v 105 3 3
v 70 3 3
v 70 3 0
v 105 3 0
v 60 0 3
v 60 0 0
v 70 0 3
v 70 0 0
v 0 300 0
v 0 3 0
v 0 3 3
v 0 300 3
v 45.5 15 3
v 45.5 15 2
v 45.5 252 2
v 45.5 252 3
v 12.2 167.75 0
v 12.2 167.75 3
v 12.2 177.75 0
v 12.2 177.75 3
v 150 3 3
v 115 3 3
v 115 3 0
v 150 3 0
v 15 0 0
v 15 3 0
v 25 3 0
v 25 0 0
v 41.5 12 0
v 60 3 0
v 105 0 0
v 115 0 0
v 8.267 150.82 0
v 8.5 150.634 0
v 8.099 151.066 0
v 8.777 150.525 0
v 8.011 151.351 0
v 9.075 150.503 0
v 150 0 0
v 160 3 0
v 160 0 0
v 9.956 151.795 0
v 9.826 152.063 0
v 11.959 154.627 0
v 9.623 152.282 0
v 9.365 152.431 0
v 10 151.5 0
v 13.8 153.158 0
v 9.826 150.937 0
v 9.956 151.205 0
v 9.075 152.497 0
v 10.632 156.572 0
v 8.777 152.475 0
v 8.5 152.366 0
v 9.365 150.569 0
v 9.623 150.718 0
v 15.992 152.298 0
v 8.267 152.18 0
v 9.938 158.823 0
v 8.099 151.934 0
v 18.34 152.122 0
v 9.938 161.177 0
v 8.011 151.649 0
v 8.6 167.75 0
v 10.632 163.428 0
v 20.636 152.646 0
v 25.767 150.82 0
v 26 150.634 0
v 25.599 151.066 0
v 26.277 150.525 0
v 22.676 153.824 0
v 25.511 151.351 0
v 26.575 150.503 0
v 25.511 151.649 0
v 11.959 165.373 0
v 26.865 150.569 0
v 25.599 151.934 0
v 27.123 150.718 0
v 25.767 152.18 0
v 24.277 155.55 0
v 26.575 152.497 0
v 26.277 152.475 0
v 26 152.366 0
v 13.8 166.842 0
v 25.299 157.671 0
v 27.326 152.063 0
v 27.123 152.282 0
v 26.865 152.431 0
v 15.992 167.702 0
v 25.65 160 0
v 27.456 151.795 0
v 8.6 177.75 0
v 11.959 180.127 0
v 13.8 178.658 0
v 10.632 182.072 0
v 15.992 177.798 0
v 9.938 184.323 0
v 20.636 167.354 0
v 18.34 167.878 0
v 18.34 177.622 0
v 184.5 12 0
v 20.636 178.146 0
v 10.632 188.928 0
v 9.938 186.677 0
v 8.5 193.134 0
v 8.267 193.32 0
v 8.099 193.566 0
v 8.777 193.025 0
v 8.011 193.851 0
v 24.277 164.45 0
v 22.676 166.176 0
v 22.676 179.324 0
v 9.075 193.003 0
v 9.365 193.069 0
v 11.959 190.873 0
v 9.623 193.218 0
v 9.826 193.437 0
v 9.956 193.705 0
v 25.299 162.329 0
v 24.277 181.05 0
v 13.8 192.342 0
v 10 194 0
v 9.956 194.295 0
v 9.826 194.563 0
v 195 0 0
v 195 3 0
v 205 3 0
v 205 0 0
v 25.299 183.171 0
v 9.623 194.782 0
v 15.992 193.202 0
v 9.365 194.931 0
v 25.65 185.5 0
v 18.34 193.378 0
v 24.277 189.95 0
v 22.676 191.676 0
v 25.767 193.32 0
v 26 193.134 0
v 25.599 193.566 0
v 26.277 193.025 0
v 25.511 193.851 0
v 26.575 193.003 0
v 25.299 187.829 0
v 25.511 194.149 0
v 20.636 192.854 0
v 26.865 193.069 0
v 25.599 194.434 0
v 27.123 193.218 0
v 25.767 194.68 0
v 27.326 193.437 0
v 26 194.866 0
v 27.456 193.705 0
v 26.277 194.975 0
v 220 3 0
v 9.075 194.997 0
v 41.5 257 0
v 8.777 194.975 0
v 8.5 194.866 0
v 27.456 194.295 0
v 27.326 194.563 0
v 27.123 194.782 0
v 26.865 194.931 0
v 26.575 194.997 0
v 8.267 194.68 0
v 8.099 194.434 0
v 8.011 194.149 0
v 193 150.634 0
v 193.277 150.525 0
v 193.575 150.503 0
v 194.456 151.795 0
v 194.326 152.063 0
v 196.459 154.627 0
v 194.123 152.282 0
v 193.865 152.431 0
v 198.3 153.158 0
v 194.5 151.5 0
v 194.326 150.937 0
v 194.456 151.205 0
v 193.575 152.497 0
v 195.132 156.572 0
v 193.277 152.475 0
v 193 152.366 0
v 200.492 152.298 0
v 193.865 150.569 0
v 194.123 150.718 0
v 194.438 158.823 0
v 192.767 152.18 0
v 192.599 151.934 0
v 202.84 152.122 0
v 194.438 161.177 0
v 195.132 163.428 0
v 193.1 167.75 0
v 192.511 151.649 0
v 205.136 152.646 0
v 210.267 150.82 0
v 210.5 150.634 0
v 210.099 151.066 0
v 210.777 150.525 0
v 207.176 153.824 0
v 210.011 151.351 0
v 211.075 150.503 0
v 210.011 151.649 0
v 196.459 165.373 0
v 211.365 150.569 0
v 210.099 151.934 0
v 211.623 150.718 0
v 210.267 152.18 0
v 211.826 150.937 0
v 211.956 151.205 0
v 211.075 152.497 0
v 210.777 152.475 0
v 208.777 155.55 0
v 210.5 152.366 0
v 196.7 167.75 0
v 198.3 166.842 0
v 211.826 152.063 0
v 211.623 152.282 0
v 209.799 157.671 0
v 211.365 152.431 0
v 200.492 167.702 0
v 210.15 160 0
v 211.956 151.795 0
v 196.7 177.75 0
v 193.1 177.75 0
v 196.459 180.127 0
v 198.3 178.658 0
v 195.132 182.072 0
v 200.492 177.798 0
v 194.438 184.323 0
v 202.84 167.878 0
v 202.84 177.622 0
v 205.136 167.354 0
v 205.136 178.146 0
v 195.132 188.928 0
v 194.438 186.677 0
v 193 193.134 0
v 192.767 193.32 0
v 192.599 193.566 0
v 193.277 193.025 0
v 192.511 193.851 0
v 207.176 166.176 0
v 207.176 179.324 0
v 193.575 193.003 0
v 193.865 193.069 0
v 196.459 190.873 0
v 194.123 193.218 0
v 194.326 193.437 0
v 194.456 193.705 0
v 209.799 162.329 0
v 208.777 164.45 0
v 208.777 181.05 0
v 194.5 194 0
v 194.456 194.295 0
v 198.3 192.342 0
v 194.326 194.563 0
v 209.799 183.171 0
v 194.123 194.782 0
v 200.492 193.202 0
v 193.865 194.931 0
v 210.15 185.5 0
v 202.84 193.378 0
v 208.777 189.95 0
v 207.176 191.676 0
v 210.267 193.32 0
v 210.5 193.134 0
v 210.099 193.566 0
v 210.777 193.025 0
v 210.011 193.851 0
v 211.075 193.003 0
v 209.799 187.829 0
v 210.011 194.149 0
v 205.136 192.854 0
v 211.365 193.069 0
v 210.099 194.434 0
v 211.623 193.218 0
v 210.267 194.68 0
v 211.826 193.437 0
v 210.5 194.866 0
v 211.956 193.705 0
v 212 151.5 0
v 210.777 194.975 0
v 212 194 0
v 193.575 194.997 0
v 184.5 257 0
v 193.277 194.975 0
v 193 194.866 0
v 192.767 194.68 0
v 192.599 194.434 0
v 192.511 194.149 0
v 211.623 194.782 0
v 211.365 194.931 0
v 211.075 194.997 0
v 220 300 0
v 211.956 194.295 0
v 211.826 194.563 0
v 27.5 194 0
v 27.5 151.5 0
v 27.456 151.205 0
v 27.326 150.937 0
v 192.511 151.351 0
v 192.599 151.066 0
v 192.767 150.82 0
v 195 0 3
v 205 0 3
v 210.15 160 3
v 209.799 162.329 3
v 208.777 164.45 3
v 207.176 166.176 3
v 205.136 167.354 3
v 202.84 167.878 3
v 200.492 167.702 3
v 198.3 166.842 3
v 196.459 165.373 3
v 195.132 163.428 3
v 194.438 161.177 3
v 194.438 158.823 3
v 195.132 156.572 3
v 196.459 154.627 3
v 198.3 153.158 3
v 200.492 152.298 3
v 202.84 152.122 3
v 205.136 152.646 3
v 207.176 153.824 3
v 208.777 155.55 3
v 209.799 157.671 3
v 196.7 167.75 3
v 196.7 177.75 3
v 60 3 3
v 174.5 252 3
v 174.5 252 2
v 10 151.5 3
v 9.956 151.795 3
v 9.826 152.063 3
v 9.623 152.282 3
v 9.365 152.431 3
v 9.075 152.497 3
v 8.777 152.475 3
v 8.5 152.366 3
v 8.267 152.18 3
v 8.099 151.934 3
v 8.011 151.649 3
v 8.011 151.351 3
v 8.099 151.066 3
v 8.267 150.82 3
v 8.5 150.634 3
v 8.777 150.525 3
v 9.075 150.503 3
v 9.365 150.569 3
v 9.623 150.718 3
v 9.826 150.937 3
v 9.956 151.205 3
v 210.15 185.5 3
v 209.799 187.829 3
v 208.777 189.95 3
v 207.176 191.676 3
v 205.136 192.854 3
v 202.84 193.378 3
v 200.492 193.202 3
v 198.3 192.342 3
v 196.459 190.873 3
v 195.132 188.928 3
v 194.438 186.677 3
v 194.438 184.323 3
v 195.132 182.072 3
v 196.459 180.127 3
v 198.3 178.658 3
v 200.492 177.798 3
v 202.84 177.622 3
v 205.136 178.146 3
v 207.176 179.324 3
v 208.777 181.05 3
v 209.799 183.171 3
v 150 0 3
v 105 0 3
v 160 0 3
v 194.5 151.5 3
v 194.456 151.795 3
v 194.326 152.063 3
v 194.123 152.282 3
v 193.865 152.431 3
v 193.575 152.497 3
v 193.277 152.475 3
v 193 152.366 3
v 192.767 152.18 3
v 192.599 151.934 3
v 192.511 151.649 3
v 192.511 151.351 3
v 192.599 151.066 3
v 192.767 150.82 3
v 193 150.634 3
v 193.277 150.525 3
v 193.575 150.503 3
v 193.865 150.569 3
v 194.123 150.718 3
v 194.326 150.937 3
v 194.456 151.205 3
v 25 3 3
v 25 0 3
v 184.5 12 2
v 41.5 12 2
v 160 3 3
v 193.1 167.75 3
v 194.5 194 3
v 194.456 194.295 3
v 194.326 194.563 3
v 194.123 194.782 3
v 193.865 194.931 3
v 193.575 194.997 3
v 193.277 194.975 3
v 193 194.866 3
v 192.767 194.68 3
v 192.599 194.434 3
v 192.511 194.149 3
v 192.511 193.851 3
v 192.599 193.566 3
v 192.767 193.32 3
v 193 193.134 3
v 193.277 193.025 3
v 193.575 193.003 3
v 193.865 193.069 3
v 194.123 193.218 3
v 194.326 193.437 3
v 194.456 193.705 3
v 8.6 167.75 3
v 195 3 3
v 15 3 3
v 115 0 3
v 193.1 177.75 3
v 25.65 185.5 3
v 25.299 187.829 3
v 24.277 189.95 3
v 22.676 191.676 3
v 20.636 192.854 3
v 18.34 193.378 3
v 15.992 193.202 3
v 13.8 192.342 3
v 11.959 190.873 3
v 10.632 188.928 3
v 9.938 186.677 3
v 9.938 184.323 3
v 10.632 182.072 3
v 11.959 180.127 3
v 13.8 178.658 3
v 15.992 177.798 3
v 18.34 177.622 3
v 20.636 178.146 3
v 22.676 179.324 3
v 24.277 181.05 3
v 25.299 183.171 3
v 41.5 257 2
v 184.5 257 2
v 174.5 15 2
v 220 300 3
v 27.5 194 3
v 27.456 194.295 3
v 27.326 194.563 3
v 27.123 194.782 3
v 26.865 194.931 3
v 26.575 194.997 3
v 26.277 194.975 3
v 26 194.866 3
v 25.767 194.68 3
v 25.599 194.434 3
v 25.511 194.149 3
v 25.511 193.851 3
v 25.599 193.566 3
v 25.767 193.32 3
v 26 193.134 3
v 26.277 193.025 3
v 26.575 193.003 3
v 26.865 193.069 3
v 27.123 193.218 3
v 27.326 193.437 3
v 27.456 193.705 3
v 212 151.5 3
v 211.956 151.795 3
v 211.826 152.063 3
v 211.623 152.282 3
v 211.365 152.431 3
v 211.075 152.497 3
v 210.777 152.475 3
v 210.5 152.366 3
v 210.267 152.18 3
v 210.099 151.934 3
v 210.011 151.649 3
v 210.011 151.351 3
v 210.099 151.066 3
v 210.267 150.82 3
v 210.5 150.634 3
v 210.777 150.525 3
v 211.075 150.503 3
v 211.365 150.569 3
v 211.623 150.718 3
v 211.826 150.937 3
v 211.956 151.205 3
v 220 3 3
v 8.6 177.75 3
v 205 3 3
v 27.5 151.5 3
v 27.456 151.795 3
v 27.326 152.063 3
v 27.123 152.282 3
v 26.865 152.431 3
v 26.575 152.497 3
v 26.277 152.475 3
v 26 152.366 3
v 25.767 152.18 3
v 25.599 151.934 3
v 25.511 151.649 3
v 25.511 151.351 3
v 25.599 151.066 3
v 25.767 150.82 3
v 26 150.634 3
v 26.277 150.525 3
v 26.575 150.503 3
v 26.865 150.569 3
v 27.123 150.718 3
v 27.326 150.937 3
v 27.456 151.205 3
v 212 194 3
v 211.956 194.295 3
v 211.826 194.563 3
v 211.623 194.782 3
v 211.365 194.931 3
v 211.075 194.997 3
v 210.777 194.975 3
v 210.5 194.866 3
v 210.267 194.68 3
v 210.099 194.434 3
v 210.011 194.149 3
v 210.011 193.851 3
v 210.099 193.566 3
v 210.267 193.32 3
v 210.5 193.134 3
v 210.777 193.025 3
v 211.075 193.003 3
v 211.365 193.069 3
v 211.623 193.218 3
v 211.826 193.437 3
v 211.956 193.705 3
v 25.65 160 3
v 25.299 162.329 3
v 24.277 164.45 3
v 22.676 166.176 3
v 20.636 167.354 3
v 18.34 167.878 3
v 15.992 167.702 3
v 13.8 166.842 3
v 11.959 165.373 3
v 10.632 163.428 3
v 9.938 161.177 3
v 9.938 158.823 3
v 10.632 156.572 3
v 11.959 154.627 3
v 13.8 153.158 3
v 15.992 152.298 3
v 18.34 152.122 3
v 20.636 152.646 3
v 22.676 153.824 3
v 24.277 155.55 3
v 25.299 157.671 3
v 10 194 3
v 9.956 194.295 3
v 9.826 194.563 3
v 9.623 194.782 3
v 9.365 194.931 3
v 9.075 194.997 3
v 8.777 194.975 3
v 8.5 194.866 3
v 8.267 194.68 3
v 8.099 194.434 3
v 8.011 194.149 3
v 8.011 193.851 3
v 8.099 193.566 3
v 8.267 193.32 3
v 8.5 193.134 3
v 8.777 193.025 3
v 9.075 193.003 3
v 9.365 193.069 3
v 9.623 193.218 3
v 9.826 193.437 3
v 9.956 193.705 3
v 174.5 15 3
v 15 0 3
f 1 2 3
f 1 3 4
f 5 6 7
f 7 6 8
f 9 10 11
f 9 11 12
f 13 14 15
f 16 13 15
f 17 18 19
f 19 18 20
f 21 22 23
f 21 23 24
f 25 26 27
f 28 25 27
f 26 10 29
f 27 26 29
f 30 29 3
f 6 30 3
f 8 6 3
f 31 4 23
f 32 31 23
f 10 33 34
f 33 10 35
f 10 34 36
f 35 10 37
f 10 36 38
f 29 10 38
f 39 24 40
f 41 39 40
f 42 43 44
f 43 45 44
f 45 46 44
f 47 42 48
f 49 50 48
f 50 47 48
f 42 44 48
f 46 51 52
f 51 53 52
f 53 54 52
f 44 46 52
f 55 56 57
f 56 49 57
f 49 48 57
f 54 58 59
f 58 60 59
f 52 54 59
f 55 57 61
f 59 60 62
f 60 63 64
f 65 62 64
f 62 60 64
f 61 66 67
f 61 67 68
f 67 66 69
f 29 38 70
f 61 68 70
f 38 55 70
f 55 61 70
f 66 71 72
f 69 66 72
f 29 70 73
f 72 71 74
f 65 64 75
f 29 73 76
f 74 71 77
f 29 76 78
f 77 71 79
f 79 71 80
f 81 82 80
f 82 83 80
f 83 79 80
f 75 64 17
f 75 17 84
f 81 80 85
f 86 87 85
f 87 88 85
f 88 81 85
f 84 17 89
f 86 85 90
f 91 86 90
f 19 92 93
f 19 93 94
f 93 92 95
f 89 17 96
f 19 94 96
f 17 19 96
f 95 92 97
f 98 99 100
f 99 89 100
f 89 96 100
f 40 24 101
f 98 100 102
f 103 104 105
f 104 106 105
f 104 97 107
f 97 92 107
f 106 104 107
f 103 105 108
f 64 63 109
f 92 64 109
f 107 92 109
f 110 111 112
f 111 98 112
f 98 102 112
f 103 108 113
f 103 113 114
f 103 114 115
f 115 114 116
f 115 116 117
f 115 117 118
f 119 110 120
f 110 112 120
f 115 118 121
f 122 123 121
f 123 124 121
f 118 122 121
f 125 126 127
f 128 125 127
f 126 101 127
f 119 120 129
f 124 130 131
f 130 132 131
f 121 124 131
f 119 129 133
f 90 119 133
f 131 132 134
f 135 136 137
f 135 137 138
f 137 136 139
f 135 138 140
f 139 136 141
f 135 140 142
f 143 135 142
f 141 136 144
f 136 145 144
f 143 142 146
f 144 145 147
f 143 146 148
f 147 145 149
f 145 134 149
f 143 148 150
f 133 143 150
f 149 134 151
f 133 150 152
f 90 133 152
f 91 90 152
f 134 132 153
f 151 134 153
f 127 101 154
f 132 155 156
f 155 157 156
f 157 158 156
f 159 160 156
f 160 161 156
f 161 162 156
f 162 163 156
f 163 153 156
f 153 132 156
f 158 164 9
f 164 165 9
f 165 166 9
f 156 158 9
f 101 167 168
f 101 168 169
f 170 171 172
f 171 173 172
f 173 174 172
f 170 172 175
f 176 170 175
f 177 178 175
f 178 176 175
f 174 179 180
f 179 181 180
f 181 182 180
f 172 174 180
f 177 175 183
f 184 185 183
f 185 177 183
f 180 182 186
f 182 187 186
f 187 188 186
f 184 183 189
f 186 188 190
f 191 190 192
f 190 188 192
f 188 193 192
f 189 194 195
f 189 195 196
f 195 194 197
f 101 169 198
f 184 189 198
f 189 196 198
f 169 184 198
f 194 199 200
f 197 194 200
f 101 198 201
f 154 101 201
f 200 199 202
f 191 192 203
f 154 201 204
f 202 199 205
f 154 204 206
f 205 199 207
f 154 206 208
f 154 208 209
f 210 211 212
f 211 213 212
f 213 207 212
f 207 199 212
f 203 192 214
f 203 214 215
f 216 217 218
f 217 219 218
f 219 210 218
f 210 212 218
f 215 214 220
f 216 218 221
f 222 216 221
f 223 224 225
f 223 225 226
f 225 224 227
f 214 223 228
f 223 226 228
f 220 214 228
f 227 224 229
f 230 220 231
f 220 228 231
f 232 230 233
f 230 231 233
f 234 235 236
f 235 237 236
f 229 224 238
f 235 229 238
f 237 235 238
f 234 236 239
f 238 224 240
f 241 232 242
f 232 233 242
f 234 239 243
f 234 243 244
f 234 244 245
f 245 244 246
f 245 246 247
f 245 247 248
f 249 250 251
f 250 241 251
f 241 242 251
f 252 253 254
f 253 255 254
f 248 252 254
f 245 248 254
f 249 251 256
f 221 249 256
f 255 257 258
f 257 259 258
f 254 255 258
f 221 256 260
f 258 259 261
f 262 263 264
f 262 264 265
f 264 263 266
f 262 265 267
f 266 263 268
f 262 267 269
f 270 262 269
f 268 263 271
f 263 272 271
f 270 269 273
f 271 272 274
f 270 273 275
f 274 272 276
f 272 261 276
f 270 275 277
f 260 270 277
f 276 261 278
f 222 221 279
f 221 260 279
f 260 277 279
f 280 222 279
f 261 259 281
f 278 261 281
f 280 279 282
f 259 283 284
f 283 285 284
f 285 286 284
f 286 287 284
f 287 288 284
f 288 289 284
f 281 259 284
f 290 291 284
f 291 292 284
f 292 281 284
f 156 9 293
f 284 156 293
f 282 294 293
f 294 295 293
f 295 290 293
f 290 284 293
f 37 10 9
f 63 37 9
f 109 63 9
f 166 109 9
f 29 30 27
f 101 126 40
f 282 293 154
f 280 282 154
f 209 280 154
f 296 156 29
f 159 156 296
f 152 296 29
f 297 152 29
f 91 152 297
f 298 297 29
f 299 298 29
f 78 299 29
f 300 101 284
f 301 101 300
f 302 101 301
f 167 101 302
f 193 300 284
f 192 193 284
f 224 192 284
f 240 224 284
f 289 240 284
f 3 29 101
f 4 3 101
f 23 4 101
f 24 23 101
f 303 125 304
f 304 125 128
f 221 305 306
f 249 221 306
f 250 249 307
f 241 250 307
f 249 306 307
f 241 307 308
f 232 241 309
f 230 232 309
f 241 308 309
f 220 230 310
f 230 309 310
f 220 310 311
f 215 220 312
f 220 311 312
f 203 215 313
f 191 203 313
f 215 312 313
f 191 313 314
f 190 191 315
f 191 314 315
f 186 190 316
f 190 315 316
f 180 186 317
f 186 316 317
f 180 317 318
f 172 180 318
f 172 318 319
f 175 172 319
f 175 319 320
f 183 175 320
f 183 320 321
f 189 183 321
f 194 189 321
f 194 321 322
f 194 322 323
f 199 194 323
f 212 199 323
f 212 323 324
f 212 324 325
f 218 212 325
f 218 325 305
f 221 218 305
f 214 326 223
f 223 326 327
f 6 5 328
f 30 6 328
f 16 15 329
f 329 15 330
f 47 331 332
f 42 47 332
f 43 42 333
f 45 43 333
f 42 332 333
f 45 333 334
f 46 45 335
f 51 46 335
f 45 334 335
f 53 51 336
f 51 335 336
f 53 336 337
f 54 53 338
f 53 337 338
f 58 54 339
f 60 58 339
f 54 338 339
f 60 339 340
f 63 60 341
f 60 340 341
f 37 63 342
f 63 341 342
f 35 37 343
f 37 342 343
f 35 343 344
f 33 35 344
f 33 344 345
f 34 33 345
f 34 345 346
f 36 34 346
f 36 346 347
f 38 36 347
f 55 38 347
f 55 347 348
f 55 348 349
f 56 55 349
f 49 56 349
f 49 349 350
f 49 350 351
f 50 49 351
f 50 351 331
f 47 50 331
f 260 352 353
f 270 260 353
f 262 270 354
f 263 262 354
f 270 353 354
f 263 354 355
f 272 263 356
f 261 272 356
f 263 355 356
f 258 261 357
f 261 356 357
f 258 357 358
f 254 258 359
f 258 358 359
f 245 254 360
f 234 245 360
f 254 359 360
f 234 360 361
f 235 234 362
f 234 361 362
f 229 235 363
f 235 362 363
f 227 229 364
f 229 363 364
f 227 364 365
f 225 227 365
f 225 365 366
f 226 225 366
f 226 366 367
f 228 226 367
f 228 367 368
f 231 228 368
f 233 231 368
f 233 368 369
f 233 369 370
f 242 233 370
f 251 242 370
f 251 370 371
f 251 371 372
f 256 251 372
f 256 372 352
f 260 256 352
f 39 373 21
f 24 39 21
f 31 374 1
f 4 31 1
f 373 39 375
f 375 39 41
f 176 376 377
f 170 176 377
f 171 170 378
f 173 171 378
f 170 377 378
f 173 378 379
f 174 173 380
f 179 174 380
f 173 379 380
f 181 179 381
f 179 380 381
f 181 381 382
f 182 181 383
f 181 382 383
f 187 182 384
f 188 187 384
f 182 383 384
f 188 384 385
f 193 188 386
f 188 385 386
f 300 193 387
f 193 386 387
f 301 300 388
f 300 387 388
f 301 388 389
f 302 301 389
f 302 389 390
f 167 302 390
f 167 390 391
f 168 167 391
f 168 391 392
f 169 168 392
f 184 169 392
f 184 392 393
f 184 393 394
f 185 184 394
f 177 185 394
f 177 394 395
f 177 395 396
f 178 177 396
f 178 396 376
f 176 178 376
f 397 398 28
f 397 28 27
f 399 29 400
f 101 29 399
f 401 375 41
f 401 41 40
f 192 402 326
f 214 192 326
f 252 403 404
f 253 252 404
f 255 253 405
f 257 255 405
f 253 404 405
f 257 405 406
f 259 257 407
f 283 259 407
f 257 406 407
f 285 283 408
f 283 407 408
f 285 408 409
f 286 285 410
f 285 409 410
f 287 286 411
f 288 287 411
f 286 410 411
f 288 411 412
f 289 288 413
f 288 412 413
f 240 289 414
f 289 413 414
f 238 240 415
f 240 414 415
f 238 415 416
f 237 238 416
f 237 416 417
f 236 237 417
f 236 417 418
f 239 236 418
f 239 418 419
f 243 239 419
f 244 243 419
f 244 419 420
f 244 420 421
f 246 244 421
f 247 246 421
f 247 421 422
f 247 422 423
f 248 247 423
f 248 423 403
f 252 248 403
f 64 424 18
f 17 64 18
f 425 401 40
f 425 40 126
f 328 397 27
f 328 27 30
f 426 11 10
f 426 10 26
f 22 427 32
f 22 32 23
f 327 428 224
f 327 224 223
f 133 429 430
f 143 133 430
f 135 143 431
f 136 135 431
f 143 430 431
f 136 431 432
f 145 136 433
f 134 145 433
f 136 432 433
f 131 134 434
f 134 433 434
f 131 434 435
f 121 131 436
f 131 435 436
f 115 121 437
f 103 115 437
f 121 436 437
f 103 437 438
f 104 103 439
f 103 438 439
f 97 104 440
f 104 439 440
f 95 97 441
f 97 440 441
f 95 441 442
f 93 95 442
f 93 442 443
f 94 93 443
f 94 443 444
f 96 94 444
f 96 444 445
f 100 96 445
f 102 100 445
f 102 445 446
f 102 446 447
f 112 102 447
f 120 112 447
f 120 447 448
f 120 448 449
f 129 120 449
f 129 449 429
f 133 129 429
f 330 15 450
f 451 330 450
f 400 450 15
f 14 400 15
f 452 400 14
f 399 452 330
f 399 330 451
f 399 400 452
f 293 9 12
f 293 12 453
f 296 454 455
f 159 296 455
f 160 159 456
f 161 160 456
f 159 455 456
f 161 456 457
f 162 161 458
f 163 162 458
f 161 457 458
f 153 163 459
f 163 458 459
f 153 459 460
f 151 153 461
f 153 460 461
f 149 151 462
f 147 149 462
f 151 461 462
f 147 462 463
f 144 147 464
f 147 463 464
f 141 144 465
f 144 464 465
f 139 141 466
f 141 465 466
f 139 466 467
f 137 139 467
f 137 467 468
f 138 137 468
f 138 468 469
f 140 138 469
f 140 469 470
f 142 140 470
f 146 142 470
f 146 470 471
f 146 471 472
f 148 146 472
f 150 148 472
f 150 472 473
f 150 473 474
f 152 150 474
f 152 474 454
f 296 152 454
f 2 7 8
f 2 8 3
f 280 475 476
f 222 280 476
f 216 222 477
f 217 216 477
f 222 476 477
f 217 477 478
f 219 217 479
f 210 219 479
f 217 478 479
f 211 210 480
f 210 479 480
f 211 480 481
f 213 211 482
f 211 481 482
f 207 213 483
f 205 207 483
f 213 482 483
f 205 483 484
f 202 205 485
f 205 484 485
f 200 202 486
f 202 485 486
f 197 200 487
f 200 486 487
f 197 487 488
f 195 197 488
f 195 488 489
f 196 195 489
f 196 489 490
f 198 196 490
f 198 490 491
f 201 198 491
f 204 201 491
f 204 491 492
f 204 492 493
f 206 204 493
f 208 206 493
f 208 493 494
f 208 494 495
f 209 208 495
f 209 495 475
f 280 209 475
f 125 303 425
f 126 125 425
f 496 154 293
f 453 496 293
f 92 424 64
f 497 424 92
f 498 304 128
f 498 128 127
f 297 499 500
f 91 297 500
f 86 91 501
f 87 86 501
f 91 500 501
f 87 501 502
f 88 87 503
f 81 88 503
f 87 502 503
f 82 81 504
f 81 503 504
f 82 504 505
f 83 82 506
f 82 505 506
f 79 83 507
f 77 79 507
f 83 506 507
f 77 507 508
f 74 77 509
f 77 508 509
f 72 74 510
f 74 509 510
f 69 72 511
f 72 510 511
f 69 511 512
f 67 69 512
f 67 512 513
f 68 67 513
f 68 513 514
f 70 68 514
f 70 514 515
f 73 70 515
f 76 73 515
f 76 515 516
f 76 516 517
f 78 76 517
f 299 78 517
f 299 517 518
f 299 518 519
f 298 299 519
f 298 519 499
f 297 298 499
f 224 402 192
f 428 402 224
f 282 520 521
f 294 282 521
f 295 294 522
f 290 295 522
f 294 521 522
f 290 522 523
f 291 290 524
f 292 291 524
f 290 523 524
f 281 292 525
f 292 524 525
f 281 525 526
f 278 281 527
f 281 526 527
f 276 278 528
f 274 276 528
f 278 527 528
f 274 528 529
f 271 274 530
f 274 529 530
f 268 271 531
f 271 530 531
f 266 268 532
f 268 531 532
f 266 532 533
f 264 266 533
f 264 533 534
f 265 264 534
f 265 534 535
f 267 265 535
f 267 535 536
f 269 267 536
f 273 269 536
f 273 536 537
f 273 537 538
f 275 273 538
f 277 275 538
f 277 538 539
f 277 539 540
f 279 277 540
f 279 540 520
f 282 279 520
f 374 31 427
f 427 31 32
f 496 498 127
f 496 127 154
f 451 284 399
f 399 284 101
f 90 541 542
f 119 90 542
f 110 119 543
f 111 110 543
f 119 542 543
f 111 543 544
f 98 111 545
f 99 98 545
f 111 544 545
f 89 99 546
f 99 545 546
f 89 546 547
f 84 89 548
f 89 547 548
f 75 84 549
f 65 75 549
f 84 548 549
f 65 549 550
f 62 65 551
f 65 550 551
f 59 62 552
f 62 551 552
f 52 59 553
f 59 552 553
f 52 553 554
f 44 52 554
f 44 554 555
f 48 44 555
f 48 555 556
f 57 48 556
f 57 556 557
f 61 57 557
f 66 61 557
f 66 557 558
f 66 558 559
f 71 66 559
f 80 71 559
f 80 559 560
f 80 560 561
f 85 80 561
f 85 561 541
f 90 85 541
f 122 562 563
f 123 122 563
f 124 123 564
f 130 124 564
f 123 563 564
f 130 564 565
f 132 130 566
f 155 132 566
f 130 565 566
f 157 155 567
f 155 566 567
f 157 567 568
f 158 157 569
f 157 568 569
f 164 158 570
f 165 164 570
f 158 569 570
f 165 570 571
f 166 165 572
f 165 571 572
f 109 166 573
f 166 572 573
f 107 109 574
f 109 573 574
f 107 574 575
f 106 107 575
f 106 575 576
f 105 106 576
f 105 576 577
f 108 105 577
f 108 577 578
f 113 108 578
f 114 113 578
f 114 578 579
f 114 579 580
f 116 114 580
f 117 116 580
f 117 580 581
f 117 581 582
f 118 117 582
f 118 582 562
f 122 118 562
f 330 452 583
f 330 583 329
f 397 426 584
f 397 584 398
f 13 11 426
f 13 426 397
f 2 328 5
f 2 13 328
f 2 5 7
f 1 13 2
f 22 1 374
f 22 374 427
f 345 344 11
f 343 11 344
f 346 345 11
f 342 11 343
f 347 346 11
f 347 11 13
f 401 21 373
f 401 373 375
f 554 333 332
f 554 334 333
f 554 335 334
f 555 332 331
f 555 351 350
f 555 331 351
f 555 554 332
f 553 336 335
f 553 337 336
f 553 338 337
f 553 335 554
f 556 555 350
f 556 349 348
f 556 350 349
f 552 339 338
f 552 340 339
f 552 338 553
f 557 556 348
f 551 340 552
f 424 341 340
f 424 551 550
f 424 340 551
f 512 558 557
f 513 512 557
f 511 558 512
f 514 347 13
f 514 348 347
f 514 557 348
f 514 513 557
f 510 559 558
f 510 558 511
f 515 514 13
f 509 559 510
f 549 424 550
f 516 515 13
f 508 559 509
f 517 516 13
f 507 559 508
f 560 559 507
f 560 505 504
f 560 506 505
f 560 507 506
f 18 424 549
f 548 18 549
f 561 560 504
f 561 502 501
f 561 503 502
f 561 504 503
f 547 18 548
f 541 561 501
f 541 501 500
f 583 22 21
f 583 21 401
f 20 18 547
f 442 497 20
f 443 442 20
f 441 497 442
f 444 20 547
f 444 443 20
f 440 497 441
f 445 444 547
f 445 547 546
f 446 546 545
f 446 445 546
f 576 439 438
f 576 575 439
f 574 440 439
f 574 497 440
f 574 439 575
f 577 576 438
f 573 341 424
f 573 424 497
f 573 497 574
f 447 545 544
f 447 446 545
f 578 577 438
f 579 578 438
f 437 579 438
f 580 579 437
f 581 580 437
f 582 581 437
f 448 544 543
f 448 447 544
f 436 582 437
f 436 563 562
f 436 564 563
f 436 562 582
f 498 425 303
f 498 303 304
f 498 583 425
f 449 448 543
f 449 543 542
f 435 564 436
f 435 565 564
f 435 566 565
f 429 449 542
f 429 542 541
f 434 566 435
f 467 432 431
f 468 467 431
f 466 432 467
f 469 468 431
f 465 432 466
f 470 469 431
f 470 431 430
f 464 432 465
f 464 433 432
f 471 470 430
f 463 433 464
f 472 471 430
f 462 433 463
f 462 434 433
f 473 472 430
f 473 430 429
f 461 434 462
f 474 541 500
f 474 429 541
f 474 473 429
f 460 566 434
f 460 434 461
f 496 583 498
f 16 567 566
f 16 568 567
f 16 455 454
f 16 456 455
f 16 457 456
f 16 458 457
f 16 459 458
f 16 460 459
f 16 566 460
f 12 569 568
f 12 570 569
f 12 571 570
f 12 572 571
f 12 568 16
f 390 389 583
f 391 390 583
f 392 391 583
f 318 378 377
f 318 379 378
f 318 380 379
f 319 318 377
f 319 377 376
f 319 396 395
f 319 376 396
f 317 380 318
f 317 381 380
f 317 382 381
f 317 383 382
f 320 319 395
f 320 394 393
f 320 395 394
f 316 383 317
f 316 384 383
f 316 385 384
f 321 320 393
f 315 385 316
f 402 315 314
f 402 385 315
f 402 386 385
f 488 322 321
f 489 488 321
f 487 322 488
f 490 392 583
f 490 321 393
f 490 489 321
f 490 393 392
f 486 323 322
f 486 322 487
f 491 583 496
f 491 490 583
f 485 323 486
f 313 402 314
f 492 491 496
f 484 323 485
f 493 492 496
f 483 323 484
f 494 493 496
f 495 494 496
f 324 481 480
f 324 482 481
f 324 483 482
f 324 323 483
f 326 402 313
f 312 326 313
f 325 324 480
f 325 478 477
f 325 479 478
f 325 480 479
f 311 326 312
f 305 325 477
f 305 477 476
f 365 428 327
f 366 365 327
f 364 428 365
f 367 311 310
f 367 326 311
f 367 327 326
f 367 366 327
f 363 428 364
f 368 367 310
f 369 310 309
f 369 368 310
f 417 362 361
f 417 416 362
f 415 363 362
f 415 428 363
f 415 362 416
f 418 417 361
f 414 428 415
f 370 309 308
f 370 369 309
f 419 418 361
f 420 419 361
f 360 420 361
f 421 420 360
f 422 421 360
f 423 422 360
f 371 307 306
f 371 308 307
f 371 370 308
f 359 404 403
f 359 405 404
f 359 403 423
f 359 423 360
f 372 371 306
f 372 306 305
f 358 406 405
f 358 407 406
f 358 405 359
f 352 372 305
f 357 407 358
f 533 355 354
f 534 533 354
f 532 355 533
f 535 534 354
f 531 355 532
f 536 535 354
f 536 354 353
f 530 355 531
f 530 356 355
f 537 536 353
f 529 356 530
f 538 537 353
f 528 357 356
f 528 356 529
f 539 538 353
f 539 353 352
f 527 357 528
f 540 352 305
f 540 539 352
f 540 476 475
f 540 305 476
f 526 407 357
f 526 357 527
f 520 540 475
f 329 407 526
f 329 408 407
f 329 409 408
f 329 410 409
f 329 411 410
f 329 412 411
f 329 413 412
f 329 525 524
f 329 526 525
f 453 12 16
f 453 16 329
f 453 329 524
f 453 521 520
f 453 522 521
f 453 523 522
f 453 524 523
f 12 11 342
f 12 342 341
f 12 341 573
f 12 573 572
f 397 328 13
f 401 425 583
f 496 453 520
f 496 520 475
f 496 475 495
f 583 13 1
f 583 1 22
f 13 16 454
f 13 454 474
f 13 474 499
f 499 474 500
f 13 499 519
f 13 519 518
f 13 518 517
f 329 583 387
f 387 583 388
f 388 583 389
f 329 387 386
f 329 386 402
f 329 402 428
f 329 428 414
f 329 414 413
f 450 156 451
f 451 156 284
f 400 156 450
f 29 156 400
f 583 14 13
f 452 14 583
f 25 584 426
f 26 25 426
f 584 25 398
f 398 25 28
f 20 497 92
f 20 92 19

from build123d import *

# Parameters (mm, degrees)
SKETCH_W        = 220
SKETCH_H        = 300
SKETCH_W_2      = 129
SKETCH_H_2      = 237
PAD_DEPTH       = 3
SKETCH001_W     = 143
SKETCH001_H     = 245
SKETCH001_W_2   = 129
SKETCH001_H_2   = 237
POCKET_DEPTH    = 2
SKETCH002_R     = 7.9
SKETCH002_R_2   = 1
SKETCH002_W     = 3.6
SKETCH002_H     = 10
SKETCH002_W_2   = 35
SKETCH002_H_2   = 3
SKETCH002_W_3   = 15
POCKET001_DEPTH = 3.001
SKETCH003_R     = 3.6
SKETCH003_R_2   = 1
POCKET002_DEPTH = 5


with BuildPart() as part:
    # Sketch → Pad (new body)
    with BuildSketch(Plane.XY):
        with Locations((110, 150)):
            Rectangle(SKETCH_W, SKETCH_H)
        with Locations((110, 133.5)):
            Rectangle(SKETCH_W_2, SKETCH_H_2, mode=Mode.SUBTRACT)
    extrude(amount=PAD_DEPTH)

    # Sketch001 (on Face9 of Pad) → Pocket (cut)
    with BuildSketch(Plane(origin=(0, 0, 0), x_dir=(1, 0, 0), z_dir=(0, 0, -1))):
        with Locations((113, -134.5)):
            Rectangle(SKETCH001_W, SKETCH001_H)
        with Locations((110, -133.5)):
            Rectangle(SKETCH001_W_2, SKETCH001_H_2, mode=Mode.SUBTRACT)
    extrude(amount=-POCKET_DEPTH, mode=Mode.SUBTRACT)

    # Sketch002 (on Face5 of Pocket) → Pocket001 (cut, through all)
    with BuildSketch(Plane.XY.offset(3)):
        with Locations((17.75, 185.5)):
            Circle(SKETCH002_R)
        with Locations((17.75, 160)):
            Circle(SKETCH002_R)
        with Locations((9, 151.5)):
            Circle(SKETCH002_R_2)
        with Locations((26.5, 151.5)):
            Circle(SKETCH002_R_2)
        with Locations((9, 194)):
            Circle(SKETCH002_R_2)
        with Locations((26.5, 194)):
            Circle(SKETCH002_R_2)
        with Locations((202.25, 185.5)):
            Circle(SKETCH002_R)
        with Locations((202.25, 160)):
            Circle(SKETCH002_R)
        with Locations((193.5, 151.5)):
            Circle(SKETCH002_R_2)
        with Locations((211, 151.5)):
            Circle(SKETCH002_R_2)
        with Locations((193.5, 194)):
            Circle(SKETCH002_R_2)
        with Locations((211, 194)):
            Circle(SKETCH002_R_2)
        with Locations((10.4, 172.75)):
            Rectangle(SKETCH002_W, SKETCH002_H)
        with Locations((194.9, 172.75)):
            Rectangle(SKETCH002_W, SKETCH002_H)
        with Locations((42.5, 1.5)):
            Rectangle(SKETCH002_W_2, SKETCH002_H_2)
        with Locations((87.5, 1.5)):
            Rectangle(SKETCH002_W_2, SKETCH002_H_2)
        with Locations((132.5, 1.5)):
            Rectangle(SKETCH002_W_2, SKETCH002_H_2)
        with Locations((177.5, 1.5)):
            Rectangle(SKETCH002_W_2, SKETCH002_H_2)
        with Locations((7.5, 1.5)):
            Rectangle(SKETCH002_W_3, SKETCH002_H_2)
        with Locations((212.5, 1.5)):
            Rectangle(SKETCH002_W_3, SKETCH002_H_2)
    extrude(amount=-POCKET001_DEPTH, mode=Mode.SUBTRACT)

    # Sketch003 (on Face5 of Pocket001) → Pocket002 (cut)
    with BuildSketch(Plane(origin=(15, 0, 0), x_dir=(0, -1, 0), z_dir=(-1, 0, 0))):
        with Locations((110, 272)):
            Circle(SKETCH003_R)
        with Locations((110, 261.5)):
            Circle(SKETCH003_R_2)
        with Locations((110, 282.5)):
            Circle(SKETCH003_R_2)
        with Locations((122.5, 261.5)):
            Circle(SKETCH003_R_2)
        with Locations((122.5, 282.5)):
            Circle(SKETCH003_R_2)
    extrude(amount=-POCKET002_DEPTH, mode=Mode.SUBTRACT)


solid = part.part
